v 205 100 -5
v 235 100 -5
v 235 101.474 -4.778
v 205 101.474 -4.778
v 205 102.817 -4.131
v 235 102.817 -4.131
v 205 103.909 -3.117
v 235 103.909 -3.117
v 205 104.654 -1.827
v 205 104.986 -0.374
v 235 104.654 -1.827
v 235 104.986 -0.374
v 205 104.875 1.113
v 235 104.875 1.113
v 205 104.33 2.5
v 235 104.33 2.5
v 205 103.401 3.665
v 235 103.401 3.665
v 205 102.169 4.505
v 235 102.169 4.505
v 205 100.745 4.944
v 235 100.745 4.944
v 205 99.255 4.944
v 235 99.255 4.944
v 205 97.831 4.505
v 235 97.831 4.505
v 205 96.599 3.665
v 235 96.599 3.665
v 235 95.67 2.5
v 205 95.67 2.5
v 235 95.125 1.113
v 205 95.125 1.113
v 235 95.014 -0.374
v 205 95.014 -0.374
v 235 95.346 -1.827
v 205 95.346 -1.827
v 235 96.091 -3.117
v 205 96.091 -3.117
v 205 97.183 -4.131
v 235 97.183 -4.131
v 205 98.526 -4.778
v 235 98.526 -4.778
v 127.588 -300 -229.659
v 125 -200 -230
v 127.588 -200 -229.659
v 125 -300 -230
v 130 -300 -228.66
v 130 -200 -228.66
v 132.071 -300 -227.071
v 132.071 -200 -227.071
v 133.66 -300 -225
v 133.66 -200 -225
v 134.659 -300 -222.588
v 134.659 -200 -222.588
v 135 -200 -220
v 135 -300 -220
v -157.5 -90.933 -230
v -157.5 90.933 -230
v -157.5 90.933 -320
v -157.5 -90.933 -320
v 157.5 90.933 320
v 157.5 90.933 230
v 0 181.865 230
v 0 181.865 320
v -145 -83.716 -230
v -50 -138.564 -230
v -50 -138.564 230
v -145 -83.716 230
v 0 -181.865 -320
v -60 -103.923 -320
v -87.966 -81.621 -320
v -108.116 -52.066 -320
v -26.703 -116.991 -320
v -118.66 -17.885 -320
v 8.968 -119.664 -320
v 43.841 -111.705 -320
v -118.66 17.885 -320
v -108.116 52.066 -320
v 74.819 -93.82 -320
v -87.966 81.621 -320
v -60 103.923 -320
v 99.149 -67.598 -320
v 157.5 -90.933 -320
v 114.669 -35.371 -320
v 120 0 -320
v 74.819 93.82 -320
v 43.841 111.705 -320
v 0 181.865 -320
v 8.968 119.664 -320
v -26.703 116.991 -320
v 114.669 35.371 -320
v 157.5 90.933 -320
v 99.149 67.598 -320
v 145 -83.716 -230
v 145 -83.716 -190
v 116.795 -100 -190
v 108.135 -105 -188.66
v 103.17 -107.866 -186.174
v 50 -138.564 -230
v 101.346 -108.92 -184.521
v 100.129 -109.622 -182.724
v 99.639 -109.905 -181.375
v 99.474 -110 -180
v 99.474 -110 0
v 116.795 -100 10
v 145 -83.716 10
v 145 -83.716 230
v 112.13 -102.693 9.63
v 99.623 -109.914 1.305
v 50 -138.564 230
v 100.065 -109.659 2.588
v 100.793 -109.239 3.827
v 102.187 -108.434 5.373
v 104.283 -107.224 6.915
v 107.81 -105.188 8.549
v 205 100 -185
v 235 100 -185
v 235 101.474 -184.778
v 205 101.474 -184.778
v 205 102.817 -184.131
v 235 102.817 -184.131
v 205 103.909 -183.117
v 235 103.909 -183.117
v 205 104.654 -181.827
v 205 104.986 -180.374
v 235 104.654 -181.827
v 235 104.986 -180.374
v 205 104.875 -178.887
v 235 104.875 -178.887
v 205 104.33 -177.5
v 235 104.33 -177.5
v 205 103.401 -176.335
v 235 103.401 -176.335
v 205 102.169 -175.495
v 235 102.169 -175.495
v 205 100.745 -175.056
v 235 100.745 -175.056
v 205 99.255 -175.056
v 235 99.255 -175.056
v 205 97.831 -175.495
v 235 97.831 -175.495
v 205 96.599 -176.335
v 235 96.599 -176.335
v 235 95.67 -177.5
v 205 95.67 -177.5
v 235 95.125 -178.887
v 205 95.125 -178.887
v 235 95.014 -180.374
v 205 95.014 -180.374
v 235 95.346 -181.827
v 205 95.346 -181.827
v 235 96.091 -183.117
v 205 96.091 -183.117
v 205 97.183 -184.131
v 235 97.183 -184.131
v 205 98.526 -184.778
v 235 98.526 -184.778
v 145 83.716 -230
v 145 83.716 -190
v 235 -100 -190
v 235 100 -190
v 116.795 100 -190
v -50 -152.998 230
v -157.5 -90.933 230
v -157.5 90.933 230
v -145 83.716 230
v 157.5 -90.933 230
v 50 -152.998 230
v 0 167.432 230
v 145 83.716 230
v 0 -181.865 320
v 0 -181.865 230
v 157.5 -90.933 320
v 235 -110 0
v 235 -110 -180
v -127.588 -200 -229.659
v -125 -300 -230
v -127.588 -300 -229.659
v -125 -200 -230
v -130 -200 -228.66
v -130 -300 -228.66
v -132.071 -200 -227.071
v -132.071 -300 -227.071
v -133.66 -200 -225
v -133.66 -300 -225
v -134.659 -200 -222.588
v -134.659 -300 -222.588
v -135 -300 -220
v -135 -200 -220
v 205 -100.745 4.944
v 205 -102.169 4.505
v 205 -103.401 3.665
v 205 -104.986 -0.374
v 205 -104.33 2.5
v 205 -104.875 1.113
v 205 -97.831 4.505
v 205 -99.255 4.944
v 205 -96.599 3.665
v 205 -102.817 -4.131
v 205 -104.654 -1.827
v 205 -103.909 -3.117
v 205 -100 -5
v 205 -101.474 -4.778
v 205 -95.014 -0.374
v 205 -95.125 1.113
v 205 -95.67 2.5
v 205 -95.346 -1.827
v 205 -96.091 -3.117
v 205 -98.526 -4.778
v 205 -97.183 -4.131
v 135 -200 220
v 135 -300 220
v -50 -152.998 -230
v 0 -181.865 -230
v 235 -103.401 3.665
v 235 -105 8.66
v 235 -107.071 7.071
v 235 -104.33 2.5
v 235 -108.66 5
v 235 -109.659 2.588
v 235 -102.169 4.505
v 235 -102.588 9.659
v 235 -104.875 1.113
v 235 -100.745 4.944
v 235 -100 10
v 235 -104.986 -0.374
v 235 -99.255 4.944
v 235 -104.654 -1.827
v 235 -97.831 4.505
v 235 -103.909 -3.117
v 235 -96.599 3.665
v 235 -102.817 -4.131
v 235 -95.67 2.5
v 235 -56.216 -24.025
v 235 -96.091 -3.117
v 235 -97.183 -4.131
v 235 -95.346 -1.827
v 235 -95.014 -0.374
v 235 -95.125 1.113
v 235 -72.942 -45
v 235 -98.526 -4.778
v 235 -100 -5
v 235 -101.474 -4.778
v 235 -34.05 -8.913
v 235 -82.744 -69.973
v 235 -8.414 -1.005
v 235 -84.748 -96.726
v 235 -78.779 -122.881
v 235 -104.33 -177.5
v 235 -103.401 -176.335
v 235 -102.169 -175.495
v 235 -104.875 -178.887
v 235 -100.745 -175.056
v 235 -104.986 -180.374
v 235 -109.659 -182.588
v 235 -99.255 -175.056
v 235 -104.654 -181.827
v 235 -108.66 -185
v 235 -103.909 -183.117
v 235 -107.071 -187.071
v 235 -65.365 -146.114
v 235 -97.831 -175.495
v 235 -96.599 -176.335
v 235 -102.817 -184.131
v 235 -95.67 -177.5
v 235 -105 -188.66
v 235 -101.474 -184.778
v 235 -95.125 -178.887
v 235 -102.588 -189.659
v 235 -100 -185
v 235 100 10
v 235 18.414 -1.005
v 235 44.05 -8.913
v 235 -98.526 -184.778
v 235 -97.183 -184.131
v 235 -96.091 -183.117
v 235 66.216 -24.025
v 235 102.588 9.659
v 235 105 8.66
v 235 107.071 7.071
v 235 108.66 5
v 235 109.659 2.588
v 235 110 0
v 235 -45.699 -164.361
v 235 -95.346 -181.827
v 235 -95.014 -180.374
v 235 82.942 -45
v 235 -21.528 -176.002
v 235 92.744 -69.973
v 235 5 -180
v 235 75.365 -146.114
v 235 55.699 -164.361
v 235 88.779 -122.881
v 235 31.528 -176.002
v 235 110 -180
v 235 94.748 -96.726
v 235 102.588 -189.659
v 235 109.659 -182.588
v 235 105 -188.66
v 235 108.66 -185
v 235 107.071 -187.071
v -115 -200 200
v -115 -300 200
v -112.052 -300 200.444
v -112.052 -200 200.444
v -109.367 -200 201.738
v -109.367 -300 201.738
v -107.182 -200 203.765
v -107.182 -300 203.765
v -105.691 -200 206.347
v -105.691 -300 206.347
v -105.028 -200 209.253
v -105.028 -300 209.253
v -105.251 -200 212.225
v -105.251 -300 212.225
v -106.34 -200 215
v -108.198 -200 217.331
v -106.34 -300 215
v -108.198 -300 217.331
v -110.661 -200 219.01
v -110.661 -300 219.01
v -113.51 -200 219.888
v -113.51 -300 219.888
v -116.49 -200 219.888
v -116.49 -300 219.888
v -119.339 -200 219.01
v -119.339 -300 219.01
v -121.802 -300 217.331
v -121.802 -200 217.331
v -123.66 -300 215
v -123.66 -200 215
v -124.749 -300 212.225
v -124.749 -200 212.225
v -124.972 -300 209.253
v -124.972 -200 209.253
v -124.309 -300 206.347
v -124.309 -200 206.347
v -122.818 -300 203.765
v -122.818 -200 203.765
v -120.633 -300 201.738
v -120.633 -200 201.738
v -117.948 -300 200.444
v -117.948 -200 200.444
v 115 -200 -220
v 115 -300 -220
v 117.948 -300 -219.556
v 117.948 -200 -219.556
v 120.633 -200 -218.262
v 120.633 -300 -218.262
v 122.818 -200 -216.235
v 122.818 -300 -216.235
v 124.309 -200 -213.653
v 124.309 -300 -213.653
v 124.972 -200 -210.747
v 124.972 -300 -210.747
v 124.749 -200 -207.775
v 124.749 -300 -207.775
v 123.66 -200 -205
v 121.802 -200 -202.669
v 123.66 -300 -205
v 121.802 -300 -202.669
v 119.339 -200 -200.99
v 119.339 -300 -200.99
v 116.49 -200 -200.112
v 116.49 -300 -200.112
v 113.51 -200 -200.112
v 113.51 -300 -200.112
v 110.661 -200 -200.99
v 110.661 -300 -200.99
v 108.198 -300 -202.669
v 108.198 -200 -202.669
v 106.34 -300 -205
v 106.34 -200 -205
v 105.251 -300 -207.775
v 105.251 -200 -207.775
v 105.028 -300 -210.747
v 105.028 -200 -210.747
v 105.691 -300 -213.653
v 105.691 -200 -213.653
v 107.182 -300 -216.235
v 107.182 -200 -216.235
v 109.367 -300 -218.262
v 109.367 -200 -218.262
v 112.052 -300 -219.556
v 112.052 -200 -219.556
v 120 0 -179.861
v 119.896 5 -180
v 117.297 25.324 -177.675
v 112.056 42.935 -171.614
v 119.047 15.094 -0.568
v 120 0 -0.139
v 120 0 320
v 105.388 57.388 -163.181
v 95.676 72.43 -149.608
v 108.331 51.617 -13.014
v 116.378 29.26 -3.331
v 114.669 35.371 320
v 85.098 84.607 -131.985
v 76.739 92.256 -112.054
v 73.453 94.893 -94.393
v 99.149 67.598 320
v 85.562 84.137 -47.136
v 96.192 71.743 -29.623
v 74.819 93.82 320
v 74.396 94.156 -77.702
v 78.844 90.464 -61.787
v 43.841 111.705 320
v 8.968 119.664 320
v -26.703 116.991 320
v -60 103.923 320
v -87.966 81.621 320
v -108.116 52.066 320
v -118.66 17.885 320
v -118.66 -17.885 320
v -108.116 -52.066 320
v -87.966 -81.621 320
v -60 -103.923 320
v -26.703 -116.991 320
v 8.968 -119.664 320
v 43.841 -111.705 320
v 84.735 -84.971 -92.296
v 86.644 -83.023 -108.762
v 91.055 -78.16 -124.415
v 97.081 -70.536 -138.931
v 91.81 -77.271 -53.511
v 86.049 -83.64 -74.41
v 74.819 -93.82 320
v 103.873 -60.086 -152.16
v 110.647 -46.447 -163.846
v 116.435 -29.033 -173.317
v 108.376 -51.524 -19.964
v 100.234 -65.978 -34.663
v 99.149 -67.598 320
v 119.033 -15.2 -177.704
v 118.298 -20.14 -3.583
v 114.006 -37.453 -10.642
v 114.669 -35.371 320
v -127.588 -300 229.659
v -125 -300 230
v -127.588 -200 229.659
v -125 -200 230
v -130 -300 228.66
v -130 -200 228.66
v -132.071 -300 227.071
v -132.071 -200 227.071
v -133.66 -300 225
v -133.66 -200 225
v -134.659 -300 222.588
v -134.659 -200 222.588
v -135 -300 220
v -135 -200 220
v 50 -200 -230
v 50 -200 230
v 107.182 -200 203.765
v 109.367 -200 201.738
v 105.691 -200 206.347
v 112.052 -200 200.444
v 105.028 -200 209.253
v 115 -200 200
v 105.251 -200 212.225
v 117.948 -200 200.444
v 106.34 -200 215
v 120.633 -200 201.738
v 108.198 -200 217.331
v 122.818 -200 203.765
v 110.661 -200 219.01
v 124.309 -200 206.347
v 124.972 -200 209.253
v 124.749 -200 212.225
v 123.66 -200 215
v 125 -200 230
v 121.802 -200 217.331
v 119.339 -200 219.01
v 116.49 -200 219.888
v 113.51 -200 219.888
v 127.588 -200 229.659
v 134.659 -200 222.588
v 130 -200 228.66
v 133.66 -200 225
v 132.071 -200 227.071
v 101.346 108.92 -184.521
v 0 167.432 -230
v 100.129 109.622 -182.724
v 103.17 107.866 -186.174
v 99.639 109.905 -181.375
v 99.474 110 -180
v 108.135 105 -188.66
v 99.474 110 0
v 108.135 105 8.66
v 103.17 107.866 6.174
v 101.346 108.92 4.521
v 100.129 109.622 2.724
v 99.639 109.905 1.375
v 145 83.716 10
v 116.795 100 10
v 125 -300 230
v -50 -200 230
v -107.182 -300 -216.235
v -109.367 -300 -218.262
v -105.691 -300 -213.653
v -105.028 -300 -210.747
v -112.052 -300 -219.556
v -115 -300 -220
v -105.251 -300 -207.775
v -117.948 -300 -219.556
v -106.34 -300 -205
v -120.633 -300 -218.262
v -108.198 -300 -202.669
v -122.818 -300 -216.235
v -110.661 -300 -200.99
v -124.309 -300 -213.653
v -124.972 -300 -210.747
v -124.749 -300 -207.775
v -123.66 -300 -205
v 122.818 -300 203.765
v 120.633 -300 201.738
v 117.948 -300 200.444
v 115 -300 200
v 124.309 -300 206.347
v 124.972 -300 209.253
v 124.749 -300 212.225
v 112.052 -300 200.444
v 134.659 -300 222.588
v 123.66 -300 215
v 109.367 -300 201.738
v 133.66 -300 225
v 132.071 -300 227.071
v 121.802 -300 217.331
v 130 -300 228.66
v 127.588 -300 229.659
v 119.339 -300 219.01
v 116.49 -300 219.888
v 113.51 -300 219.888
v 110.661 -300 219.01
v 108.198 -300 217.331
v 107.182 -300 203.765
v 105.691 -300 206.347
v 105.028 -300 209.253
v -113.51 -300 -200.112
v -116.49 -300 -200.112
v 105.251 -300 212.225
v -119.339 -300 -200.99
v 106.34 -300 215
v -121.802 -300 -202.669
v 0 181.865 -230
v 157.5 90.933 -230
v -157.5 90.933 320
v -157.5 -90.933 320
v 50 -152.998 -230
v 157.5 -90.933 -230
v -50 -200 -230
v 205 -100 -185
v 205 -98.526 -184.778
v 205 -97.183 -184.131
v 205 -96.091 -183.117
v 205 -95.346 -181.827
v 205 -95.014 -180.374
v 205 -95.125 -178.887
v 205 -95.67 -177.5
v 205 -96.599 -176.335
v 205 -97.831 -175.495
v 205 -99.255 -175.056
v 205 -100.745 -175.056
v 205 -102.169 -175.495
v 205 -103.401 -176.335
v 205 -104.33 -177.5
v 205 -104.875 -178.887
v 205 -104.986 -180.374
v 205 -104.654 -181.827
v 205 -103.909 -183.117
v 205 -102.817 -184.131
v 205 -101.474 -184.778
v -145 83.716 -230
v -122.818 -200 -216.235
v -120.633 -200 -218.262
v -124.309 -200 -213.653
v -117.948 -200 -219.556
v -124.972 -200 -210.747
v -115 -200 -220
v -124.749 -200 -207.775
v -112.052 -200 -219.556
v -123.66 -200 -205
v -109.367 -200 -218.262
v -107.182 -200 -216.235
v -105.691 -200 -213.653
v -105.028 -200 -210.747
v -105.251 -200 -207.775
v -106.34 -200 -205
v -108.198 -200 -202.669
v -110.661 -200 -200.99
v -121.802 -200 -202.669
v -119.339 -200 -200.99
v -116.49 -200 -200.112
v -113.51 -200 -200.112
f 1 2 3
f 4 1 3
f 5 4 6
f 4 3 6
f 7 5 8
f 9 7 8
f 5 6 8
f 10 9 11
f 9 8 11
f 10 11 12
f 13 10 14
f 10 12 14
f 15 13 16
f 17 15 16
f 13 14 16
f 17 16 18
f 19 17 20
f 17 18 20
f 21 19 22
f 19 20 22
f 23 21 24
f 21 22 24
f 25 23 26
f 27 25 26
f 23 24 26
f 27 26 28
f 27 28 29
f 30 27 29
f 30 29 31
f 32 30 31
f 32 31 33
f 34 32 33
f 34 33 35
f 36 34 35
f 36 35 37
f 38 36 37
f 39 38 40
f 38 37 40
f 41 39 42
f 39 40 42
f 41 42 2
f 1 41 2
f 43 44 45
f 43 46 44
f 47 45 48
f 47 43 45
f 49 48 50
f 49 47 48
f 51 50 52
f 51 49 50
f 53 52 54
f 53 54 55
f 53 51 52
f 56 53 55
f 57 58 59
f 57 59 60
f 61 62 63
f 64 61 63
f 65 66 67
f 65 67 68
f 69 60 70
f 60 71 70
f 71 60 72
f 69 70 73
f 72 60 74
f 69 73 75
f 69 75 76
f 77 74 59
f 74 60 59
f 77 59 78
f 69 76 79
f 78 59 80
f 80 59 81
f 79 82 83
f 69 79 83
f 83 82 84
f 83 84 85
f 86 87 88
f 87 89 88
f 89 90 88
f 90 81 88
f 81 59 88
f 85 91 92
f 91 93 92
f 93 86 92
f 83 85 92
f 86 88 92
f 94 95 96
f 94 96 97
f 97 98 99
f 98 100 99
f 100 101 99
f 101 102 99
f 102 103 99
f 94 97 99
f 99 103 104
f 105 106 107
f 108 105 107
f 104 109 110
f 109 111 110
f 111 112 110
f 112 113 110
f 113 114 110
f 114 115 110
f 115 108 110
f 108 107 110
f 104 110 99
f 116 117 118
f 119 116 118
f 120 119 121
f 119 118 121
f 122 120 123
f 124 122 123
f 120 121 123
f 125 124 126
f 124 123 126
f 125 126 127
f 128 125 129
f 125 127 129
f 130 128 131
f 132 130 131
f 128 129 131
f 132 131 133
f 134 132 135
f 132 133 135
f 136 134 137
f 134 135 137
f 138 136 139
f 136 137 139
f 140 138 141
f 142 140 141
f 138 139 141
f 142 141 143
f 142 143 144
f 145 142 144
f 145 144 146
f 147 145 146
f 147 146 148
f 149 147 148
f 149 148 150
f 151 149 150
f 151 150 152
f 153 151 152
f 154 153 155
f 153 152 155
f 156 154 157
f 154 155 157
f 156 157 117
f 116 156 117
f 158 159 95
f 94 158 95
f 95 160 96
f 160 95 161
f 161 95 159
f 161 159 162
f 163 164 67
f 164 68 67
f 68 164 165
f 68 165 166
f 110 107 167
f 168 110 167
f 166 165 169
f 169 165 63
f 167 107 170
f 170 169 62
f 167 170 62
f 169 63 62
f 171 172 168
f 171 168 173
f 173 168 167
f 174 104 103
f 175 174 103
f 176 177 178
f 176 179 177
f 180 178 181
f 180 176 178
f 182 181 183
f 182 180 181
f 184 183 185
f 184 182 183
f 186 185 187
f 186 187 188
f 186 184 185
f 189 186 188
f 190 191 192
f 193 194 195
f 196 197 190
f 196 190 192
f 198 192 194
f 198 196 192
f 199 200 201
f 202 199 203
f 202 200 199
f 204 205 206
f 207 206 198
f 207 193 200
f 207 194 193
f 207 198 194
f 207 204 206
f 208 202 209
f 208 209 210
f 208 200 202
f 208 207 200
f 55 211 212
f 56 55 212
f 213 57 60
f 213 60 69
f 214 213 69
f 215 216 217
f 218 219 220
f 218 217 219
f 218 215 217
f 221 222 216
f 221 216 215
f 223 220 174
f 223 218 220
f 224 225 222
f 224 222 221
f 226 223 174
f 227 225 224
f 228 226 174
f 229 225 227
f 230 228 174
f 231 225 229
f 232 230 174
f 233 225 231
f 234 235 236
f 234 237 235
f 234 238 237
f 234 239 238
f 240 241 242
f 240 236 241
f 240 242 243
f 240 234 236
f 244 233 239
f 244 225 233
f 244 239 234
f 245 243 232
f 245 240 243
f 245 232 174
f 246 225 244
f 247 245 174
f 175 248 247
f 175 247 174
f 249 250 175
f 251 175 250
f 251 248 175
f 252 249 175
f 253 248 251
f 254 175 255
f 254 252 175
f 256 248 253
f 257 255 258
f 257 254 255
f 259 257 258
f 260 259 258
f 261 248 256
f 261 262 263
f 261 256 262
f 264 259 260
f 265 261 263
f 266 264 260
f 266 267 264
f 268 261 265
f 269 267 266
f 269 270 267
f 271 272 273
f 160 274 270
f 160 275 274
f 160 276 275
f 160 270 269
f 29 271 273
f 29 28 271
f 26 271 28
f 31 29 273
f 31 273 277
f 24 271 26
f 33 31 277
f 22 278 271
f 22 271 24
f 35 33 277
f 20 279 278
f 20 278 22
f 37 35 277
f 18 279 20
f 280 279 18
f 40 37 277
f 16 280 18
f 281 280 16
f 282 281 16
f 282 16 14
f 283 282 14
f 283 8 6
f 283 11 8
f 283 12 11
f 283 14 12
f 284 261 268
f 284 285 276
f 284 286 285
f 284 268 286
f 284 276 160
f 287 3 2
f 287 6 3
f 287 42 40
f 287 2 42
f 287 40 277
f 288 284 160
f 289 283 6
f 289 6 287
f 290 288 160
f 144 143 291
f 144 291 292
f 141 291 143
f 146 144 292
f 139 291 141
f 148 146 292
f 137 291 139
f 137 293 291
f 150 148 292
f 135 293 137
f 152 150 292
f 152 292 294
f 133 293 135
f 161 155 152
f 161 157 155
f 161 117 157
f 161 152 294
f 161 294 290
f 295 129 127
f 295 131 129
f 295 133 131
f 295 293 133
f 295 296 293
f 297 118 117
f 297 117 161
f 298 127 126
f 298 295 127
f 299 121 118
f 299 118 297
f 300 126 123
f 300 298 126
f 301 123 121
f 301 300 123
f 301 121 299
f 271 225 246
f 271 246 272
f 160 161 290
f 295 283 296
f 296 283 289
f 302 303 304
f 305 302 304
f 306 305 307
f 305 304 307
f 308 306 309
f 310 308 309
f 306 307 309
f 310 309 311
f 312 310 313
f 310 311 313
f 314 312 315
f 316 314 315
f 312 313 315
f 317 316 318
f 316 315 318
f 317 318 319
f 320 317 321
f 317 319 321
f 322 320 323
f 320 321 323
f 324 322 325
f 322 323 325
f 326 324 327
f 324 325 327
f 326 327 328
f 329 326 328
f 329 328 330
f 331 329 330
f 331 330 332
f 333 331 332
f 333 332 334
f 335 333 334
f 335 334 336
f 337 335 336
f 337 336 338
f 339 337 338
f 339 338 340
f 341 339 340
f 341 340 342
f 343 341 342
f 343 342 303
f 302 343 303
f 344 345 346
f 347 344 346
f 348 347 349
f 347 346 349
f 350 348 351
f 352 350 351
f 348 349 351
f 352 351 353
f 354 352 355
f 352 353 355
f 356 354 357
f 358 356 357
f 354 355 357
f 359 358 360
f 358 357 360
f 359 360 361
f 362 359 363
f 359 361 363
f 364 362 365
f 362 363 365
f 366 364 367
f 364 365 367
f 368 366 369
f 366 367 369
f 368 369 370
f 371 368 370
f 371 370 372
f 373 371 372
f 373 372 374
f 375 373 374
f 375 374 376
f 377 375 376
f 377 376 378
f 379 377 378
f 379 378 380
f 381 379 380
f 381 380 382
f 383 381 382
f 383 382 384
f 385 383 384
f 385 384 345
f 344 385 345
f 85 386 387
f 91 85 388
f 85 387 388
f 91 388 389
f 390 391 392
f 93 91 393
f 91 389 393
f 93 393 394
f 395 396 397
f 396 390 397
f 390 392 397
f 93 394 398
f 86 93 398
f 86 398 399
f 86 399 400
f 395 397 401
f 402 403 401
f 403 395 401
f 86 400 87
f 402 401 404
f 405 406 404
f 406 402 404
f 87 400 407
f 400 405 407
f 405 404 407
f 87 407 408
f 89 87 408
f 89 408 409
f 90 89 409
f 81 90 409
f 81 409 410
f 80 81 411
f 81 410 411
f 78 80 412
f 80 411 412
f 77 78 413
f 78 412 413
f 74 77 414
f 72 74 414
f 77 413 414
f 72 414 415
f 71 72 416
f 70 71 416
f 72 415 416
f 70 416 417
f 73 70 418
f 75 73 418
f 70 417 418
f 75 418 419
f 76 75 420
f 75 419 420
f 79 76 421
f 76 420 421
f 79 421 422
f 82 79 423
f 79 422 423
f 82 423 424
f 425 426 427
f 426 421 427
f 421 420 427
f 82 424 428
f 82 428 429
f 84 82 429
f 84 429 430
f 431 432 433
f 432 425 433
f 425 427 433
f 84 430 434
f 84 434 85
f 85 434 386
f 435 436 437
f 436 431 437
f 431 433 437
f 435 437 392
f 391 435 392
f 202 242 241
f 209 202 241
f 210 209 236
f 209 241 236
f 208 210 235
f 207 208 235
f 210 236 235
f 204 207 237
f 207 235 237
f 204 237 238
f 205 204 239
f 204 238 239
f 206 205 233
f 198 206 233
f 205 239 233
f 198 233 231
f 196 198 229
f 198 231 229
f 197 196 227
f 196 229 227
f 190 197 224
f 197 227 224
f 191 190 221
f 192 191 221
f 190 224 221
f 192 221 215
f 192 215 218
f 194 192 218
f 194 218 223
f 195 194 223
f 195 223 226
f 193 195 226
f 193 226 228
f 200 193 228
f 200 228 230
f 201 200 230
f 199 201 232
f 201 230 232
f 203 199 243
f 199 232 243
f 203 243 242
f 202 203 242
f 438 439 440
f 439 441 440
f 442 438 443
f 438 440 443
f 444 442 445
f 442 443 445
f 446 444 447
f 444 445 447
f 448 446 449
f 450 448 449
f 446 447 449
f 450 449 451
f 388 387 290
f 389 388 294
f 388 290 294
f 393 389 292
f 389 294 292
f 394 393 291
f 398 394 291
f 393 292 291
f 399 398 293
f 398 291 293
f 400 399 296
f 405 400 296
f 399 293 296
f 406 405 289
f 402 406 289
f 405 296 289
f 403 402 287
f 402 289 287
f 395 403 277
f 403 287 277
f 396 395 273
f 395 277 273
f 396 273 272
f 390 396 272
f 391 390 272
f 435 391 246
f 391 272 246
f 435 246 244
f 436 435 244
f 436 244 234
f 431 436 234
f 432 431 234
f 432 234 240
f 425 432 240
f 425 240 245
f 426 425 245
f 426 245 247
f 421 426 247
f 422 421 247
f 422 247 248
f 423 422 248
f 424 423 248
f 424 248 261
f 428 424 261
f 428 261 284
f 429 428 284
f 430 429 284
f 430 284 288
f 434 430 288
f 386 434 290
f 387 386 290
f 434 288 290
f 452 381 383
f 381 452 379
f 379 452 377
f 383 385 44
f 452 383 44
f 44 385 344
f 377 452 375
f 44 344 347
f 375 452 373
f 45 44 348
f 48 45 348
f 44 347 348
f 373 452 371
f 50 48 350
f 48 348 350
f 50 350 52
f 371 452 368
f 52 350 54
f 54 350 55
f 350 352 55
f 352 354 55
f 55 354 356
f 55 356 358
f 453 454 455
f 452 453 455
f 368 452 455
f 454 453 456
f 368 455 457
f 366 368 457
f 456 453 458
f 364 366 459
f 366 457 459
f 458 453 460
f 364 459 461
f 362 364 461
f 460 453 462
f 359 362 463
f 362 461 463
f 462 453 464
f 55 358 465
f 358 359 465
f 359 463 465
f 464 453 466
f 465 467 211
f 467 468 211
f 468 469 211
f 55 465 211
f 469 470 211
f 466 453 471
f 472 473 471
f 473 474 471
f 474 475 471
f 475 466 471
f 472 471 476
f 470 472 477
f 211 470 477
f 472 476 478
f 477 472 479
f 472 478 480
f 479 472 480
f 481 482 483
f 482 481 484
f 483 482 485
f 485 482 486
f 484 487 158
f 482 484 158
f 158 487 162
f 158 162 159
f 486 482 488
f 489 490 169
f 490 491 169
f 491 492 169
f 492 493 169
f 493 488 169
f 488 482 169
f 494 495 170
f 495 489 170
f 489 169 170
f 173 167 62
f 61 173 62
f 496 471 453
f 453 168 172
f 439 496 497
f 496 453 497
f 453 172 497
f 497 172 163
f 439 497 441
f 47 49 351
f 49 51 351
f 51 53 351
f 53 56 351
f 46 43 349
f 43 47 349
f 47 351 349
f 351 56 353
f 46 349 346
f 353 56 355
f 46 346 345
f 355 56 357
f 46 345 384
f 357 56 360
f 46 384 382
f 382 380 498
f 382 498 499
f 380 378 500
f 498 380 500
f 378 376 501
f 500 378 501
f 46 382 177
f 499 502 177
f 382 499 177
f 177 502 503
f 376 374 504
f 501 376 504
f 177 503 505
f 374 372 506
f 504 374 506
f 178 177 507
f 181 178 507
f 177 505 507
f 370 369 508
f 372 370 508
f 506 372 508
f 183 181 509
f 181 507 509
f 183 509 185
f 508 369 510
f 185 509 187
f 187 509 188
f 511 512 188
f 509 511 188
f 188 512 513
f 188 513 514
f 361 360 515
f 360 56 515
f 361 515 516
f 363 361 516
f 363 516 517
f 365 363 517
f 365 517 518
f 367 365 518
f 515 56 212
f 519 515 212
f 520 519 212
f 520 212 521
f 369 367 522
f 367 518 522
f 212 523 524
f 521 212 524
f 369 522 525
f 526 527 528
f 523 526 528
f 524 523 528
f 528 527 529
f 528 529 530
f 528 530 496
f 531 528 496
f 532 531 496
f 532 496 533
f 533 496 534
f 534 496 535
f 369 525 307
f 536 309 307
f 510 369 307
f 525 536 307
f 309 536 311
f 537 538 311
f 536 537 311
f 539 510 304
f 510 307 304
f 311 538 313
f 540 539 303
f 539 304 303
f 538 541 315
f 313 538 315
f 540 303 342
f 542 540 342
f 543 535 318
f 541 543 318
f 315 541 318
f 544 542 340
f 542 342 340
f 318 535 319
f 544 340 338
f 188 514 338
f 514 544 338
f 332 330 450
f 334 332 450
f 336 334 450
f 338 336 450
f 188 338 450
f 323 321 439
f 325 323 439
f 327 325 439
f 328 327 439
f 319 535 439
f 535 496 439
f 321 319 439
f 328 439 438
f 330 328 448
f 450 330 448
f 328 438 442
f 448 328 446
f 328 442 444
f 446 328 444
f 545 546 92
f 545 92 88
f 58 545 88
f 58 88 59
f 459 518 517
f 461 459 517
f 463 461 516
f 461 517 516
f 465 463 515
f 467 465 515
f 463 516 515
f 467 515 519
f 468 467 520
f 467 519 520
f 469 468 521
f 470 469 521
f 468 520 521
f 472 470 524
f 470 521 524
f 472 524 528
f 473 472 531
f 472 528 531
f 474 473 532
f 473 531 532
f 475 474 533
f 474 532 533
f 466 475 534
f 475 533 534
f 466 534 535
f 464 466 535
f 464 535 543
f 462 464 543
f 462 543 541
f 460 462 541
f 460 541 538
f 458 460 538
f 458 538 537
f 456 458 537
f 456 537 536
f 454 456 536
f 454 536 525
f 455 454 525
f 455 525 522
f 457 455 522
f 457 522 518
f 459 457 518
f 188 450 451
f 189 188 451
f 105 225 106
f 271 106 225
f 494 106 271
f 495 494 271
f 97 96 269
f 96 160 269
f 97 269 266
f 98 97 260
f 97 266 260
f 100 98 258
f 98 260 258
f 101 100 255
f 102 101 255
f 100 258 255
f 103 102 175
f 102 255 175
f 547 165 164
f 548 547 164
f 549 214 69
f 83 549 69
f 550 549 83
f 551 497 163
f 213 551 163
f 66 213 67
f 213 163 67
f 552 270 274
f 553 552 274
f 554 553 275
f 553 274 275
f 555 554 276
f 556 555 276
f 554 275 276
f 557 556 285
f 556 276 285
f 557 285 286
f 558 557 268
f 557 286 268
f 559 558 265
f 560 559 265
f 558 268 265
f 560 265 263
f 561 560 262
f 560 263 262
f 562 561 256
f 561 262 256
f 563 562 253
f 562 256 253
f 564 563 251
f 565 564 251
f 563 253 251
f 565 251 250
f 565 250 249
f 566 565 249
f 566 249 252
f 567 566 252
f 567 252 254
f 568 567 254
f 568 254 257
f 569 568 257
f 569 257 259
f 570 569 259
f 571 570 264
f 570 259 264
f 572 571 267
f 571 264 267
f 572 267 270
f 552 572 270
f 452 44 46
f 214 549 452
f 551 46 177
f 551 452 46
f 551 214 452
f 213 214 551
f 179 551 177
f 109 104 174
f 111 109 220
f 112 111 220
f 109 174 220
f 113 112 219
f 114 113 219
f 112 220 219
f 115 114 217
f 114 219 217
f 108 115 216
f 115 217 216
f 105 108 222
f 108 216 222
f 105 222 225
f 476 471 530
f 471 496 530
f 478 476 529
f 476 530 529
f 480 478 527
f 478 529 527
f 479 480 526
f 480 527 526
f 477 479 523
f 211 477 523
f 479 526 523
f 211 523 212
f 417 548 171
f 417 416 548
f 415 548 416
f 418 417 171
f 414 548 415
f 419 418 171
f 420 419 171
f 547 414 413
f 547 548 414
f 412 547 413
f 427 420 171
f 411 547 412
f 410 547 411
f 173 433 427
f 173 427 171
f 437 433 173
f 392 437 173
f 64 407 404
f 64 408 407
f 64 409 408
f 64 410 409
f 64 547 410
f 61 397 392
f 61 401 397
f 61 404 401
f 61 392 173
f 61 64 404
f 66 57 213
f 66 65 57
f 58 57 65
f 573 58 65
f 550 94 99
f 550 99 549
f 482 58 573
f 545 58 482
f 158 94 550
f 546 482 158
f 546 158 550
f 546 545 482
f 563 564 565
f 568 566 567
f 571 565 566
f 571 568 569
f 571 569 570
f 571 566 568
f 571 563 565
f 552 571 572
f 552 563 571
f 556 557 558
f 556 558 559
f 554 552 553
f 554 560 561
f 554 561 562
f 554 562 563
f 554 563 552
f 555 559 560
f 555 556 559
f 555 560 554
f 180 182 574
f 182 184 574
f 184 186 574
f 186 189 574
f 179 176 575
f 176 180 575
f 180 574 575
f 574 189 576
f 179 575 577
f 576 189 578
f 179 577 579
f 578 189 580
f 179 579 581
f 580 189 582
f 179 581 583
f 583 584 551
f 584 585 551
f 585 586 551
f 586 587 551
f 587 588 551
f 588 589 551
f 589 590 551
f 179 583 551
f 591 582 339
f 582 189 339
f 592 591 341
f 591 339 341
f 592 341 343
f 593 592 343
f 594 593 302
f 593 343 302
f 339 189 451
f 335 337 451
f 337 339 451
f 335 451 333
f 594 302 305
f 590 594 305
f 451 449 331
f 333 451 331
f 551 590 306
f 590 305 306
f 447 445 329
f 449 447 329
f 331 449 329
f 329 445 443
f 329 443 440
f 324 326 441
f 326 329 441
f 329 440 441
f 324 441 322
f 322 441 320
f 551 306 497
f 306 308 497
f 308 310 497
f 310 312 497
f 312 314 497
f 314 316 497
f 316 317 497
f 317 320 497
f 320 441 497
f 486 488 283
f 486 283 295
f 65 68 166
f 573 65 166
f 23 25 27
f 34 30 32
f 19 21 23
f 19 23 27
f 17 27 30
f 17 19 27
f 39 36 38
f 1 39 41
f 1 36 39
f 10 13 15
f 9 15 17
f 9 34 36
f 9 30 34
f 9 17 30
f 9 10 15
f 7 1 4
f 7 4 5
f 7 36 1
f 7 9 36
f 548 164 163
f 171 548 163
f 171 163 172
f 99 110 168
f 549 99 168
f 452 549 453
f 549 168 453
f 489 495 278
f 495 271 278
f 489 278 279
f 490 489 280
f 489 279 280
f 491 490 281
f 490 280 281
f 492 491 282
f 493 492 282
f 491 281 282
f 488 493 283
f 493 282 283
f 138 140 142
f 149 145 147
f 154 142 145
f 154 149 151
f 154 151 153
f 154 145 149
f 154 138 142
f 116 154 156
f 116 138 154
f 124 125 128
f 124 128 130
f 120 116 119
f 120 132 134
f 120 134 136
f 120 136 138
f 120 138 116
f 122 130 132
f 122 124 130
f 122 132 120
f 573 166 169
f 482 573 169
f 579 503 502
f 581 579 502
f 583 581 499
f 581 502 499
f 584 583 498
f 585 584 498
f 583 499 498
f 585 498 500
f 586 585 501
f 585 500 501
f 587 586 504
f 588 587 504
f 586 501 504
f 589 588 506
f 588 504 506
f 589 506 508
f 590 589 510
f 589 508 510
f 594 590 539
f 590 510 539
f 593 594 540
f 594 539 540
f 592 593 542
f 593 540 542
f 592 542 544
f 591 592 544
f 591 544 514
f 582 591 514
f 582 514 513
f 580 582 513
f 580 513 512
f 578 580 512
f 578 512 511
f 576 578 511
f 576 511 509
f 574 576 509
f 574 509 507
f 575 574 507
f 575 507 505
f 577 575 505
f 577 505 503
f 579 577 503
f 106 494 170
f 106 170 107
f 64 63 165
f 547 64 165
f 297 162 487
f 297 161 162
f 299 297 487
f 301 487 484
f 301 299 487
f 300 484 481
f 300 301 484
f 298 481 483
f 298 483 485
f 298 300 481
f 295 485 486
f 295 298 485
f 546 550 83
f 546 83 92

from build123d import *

# Parameters (mm, degrees)
EXTRUDE_1_DEPTH          = 230
EXTRUDE_2_DEPTH          = 90
EXTRUDE_3_DEPTH          = 90
EXTRUDE_3_DEPTH_BACK     = 145
SKETCH_5_W               = 200
SKETCH_5_H               = 220
SKETCH_4_R               = 120
CUT_EXTRUDE_1_DEPTH      = 745.865759718
CUT_EXTRUDE_2_REACH      = 590.605
CUT_EXTRUDE_2_END_RADIUS = 120
SKETCH_6_R               = 90
CUT_EXTRUDE_3_REACH      = 626.355
SKETCH_7_R               = 10
SKETCH_8_R               = 5
CUT_EXTRUDE_4_DEPTH      = 30
FILLET_1_R               = 10
FILLET_2_R               = 10


with BuildPart() as part:
    # Эскиз1 → Бобышка-Вытянуть1 (new body)
    with BuildSketch(Plane.XY):
        Polygon((-50, -200), (-50, -138.564064606), (-145, -83.715789032), (-145, 83.715789032), (0, 167.431578065), (145, 83.715789032), (145, -83.715789032), (50, -138.564064606), (50, -200), (135, -200), (135, -300), (-135, -300), (-135, -200), align=None)
    extrude(amount=EXTRUDE_1_DEPTH)

    # Эскиз2 → Бобышка-Вытянуть2 (add)
    with BuildSketch(Plane.XY.offset(230)):
        Polygon((0, 181.865334795), (-157.5, 90.932667397), (-157.5, -90.932667397), (0, -181.865334795), (157.5, -90.932667397), (157.5, 90.932667397), align=None)
    extrude(amount=EXTRUDE_2_DEPTH)

    # Зеркальное отражение1: part across plane


with BuildPart() as part_1:
    add(part.part)
    add(part.part.mirror(Plane.XY))

    # Эскиз5 → Бобышка-Вытянуть3 (add, two sides: drawn at the far end of the back side and taken through both)
    with BuildSketch(Plane(origin=(145, 0, 0), x_dir=(0, 0, -1), z_dir=(1, 0, 0)).offset(-EXTRUDE_3_DEPTH_BACK)):
        with Locations((90, 0)):
            Rectangle(SKETCH_5_W, SKETCH_5_H)
    extrude(amount=EXTRUDE_3_DEPTH + EXTRUDE_3_DEPTH_BACK)

    # Эскиз4 → Вырез-Вытянуть1 (cut, through all)
    with BuildSketch(Plane.XY.offset(320)):
        Circle(SKETCH_4_R)
    extrude(amount=-CUT_EXTRUDE_1_DEPTH, mode=Mode.SUBTRACT)

    # Вырез-Вытянуть2: up to this cylinder (the profile starts outside it)
    cut_extrude_2_end = Plane(origin=(0, 0, -90), z_dir=(0, 0, 1)) * Cylinder(CUT_EXTRUDE_2_END_RADIUS, 1422.21, mode=Mode.PRIVATE)
    # Эскиз6 → Вырез-Вытянуть2 (cut, up to the surface)
    with BuildSketch(Plane(origin=(235, 0, 0), x_dir=(0, 0, -1), z_dir=(1, 0, 0)), mode=Mode.PRIVATE) as cut_extrude_2_sk1:
        with Locations((90, 5)):
            Circle(SKETCH_6_R)
    cut_extrude_2_tool1 = extrude(cut_extrude_2_sk1.sketch, amount=-CUT_EXTRUDE_2_REACH, mode=Mode.PRIVATE) - cut_extrude_2_end
    add(cut_extrude_2_tool1.solids().sort_by_distance((235, 5, -90))[0], mode=Mode.SUBTRACT)

    # Эскиз7 → Вырез-Вытянуть3 (cut, up to next)
    with BuildSketch(Plane.XZ.offset(300), mode=Mode.PRIVATE) as cut_extrude_3_sk1:
        with Locations(Location((115, 210, 0), (0, 0, 270))):
            Circle(SKETCH_7_R)
    cut_extrude_3_tool1 = extrude(cut_extrude_3_sk1.sketch, amount=-CUT_EXTRUDE_3_REACH, mode=Mode.PRIVATE) & part_1.part
    # Эскиз7 → Вырез-Вытянуть3 (cut, up to next)
    with BuildSketch(Plane.XZ.offset(300), mode=Mode.PRIVATE) as cut_extrude_3_sk2:
        with Locations(Location((-115, 210, 0), (0, 0, 270))):
            Circle(SKETCH_7_R)
    cut_extrude_3_tool2 = extrude(cut_extrude_3_sk2.sketch, amount=-CUT_EXTRUDE_3_REACH, mode=Mode.PRIVATE) & part_1.part
    # Эскиз7 → Вырез-Вытянуть3 (cut, up to next)
    with BuildSketch(Plane.XZ.offset(300), mode=Mode.PRIVATE) as cut_extrude_3_sk3:
        with Locations(Location((115, -210, 0), (0, 0, 270))):
            Circle(SKETCH_7_R)
    cut_extrude_3_tool3 = extrude(cut_extrude_3_sk3.sketch, amount=-CUT_EXTRUDE_3_REACH, mode=Mode.PRIVATE) & part_1.part
    # Эскиз7 → Вырез-Вытянуть3 (cut, up to next)
    with BuildSketch(Plane.XZ.offset(300), mode=Mode.PRIVATE) as cut_extrude_3_sk4:
        with Locations(Location((-115, -210, 0), (0, 0, 270))):
            Circle(SKETCH_7_R)
    cut_extrude_3_tool4 = extrude(cut_extrude_3_sk4.sketch, amount=-CUT_EXTRUDE_3_REACH, mode=Mode.PRIVATE) & part_1.part
    add(cut_extrude_3_tool1.solids().sort_by_distance((115, -300, 210))[0], mode=Mode.SUBTRACT)
    add(cut_extrude_3_tool2.solids().sort_by_distance((-115, -300, 210))[0], mode=Mode.SUBTRACT)
    add(cut_extrude_3_tool3.solids().sort_by_distance((115, -300, -210))[0], mode=Mode.SUBTRACT)
    add(cut_extrude_3_tool4.solids().sort_by_distance((-115, -300, -210))[0], mode=Mode.SUBTRACT)

    # Эскиз8 → Вырез-Вытянуть4 (cut)
    with BuildSketch(Plane(origin=(235, 0, 0), x_dir=(0, 0, -1), z_dir=(1, 0, 0))):
        with Locations((0, 100)):
            Circle(SKETCH_8_R)
        with Locations((0, -100)):
            Circle(SKETCH_8_R)
        with Locations((180, 100)):
            Circle(SKETCH_8_R)
        with Locations((180, -100)):
            Circle(SKETCH_8_R)
    extrude(amount=-CUT_EXTRUDE_4_DEPTH, mode=Mode.SUBTRACT)

    # Скругление1
    fillet_1_edges = [part_1.edges().sort_by_distance(p)[0] for p in [
        (-135, -250, 230),
        (135, -250, 230),
        (-135, -250, -230),
        (135, -250, -230),
    ]]
    fillet(fillet_1_edges, radius=FILLET_1_R)

    # Скругление2
    fillet_2_edges = [part_1.edges().sort_by_distance(p)[0] for p in [
        (167.237205584, 110, 10),
        (167.237205584, -110, -190),
        (167.237205584, 110, -190),
        (167.237205584, -110, 10),
    ]]
    fillet(fillet_2_edges, radius=FILLET_2_R)


solid = part_1.part
